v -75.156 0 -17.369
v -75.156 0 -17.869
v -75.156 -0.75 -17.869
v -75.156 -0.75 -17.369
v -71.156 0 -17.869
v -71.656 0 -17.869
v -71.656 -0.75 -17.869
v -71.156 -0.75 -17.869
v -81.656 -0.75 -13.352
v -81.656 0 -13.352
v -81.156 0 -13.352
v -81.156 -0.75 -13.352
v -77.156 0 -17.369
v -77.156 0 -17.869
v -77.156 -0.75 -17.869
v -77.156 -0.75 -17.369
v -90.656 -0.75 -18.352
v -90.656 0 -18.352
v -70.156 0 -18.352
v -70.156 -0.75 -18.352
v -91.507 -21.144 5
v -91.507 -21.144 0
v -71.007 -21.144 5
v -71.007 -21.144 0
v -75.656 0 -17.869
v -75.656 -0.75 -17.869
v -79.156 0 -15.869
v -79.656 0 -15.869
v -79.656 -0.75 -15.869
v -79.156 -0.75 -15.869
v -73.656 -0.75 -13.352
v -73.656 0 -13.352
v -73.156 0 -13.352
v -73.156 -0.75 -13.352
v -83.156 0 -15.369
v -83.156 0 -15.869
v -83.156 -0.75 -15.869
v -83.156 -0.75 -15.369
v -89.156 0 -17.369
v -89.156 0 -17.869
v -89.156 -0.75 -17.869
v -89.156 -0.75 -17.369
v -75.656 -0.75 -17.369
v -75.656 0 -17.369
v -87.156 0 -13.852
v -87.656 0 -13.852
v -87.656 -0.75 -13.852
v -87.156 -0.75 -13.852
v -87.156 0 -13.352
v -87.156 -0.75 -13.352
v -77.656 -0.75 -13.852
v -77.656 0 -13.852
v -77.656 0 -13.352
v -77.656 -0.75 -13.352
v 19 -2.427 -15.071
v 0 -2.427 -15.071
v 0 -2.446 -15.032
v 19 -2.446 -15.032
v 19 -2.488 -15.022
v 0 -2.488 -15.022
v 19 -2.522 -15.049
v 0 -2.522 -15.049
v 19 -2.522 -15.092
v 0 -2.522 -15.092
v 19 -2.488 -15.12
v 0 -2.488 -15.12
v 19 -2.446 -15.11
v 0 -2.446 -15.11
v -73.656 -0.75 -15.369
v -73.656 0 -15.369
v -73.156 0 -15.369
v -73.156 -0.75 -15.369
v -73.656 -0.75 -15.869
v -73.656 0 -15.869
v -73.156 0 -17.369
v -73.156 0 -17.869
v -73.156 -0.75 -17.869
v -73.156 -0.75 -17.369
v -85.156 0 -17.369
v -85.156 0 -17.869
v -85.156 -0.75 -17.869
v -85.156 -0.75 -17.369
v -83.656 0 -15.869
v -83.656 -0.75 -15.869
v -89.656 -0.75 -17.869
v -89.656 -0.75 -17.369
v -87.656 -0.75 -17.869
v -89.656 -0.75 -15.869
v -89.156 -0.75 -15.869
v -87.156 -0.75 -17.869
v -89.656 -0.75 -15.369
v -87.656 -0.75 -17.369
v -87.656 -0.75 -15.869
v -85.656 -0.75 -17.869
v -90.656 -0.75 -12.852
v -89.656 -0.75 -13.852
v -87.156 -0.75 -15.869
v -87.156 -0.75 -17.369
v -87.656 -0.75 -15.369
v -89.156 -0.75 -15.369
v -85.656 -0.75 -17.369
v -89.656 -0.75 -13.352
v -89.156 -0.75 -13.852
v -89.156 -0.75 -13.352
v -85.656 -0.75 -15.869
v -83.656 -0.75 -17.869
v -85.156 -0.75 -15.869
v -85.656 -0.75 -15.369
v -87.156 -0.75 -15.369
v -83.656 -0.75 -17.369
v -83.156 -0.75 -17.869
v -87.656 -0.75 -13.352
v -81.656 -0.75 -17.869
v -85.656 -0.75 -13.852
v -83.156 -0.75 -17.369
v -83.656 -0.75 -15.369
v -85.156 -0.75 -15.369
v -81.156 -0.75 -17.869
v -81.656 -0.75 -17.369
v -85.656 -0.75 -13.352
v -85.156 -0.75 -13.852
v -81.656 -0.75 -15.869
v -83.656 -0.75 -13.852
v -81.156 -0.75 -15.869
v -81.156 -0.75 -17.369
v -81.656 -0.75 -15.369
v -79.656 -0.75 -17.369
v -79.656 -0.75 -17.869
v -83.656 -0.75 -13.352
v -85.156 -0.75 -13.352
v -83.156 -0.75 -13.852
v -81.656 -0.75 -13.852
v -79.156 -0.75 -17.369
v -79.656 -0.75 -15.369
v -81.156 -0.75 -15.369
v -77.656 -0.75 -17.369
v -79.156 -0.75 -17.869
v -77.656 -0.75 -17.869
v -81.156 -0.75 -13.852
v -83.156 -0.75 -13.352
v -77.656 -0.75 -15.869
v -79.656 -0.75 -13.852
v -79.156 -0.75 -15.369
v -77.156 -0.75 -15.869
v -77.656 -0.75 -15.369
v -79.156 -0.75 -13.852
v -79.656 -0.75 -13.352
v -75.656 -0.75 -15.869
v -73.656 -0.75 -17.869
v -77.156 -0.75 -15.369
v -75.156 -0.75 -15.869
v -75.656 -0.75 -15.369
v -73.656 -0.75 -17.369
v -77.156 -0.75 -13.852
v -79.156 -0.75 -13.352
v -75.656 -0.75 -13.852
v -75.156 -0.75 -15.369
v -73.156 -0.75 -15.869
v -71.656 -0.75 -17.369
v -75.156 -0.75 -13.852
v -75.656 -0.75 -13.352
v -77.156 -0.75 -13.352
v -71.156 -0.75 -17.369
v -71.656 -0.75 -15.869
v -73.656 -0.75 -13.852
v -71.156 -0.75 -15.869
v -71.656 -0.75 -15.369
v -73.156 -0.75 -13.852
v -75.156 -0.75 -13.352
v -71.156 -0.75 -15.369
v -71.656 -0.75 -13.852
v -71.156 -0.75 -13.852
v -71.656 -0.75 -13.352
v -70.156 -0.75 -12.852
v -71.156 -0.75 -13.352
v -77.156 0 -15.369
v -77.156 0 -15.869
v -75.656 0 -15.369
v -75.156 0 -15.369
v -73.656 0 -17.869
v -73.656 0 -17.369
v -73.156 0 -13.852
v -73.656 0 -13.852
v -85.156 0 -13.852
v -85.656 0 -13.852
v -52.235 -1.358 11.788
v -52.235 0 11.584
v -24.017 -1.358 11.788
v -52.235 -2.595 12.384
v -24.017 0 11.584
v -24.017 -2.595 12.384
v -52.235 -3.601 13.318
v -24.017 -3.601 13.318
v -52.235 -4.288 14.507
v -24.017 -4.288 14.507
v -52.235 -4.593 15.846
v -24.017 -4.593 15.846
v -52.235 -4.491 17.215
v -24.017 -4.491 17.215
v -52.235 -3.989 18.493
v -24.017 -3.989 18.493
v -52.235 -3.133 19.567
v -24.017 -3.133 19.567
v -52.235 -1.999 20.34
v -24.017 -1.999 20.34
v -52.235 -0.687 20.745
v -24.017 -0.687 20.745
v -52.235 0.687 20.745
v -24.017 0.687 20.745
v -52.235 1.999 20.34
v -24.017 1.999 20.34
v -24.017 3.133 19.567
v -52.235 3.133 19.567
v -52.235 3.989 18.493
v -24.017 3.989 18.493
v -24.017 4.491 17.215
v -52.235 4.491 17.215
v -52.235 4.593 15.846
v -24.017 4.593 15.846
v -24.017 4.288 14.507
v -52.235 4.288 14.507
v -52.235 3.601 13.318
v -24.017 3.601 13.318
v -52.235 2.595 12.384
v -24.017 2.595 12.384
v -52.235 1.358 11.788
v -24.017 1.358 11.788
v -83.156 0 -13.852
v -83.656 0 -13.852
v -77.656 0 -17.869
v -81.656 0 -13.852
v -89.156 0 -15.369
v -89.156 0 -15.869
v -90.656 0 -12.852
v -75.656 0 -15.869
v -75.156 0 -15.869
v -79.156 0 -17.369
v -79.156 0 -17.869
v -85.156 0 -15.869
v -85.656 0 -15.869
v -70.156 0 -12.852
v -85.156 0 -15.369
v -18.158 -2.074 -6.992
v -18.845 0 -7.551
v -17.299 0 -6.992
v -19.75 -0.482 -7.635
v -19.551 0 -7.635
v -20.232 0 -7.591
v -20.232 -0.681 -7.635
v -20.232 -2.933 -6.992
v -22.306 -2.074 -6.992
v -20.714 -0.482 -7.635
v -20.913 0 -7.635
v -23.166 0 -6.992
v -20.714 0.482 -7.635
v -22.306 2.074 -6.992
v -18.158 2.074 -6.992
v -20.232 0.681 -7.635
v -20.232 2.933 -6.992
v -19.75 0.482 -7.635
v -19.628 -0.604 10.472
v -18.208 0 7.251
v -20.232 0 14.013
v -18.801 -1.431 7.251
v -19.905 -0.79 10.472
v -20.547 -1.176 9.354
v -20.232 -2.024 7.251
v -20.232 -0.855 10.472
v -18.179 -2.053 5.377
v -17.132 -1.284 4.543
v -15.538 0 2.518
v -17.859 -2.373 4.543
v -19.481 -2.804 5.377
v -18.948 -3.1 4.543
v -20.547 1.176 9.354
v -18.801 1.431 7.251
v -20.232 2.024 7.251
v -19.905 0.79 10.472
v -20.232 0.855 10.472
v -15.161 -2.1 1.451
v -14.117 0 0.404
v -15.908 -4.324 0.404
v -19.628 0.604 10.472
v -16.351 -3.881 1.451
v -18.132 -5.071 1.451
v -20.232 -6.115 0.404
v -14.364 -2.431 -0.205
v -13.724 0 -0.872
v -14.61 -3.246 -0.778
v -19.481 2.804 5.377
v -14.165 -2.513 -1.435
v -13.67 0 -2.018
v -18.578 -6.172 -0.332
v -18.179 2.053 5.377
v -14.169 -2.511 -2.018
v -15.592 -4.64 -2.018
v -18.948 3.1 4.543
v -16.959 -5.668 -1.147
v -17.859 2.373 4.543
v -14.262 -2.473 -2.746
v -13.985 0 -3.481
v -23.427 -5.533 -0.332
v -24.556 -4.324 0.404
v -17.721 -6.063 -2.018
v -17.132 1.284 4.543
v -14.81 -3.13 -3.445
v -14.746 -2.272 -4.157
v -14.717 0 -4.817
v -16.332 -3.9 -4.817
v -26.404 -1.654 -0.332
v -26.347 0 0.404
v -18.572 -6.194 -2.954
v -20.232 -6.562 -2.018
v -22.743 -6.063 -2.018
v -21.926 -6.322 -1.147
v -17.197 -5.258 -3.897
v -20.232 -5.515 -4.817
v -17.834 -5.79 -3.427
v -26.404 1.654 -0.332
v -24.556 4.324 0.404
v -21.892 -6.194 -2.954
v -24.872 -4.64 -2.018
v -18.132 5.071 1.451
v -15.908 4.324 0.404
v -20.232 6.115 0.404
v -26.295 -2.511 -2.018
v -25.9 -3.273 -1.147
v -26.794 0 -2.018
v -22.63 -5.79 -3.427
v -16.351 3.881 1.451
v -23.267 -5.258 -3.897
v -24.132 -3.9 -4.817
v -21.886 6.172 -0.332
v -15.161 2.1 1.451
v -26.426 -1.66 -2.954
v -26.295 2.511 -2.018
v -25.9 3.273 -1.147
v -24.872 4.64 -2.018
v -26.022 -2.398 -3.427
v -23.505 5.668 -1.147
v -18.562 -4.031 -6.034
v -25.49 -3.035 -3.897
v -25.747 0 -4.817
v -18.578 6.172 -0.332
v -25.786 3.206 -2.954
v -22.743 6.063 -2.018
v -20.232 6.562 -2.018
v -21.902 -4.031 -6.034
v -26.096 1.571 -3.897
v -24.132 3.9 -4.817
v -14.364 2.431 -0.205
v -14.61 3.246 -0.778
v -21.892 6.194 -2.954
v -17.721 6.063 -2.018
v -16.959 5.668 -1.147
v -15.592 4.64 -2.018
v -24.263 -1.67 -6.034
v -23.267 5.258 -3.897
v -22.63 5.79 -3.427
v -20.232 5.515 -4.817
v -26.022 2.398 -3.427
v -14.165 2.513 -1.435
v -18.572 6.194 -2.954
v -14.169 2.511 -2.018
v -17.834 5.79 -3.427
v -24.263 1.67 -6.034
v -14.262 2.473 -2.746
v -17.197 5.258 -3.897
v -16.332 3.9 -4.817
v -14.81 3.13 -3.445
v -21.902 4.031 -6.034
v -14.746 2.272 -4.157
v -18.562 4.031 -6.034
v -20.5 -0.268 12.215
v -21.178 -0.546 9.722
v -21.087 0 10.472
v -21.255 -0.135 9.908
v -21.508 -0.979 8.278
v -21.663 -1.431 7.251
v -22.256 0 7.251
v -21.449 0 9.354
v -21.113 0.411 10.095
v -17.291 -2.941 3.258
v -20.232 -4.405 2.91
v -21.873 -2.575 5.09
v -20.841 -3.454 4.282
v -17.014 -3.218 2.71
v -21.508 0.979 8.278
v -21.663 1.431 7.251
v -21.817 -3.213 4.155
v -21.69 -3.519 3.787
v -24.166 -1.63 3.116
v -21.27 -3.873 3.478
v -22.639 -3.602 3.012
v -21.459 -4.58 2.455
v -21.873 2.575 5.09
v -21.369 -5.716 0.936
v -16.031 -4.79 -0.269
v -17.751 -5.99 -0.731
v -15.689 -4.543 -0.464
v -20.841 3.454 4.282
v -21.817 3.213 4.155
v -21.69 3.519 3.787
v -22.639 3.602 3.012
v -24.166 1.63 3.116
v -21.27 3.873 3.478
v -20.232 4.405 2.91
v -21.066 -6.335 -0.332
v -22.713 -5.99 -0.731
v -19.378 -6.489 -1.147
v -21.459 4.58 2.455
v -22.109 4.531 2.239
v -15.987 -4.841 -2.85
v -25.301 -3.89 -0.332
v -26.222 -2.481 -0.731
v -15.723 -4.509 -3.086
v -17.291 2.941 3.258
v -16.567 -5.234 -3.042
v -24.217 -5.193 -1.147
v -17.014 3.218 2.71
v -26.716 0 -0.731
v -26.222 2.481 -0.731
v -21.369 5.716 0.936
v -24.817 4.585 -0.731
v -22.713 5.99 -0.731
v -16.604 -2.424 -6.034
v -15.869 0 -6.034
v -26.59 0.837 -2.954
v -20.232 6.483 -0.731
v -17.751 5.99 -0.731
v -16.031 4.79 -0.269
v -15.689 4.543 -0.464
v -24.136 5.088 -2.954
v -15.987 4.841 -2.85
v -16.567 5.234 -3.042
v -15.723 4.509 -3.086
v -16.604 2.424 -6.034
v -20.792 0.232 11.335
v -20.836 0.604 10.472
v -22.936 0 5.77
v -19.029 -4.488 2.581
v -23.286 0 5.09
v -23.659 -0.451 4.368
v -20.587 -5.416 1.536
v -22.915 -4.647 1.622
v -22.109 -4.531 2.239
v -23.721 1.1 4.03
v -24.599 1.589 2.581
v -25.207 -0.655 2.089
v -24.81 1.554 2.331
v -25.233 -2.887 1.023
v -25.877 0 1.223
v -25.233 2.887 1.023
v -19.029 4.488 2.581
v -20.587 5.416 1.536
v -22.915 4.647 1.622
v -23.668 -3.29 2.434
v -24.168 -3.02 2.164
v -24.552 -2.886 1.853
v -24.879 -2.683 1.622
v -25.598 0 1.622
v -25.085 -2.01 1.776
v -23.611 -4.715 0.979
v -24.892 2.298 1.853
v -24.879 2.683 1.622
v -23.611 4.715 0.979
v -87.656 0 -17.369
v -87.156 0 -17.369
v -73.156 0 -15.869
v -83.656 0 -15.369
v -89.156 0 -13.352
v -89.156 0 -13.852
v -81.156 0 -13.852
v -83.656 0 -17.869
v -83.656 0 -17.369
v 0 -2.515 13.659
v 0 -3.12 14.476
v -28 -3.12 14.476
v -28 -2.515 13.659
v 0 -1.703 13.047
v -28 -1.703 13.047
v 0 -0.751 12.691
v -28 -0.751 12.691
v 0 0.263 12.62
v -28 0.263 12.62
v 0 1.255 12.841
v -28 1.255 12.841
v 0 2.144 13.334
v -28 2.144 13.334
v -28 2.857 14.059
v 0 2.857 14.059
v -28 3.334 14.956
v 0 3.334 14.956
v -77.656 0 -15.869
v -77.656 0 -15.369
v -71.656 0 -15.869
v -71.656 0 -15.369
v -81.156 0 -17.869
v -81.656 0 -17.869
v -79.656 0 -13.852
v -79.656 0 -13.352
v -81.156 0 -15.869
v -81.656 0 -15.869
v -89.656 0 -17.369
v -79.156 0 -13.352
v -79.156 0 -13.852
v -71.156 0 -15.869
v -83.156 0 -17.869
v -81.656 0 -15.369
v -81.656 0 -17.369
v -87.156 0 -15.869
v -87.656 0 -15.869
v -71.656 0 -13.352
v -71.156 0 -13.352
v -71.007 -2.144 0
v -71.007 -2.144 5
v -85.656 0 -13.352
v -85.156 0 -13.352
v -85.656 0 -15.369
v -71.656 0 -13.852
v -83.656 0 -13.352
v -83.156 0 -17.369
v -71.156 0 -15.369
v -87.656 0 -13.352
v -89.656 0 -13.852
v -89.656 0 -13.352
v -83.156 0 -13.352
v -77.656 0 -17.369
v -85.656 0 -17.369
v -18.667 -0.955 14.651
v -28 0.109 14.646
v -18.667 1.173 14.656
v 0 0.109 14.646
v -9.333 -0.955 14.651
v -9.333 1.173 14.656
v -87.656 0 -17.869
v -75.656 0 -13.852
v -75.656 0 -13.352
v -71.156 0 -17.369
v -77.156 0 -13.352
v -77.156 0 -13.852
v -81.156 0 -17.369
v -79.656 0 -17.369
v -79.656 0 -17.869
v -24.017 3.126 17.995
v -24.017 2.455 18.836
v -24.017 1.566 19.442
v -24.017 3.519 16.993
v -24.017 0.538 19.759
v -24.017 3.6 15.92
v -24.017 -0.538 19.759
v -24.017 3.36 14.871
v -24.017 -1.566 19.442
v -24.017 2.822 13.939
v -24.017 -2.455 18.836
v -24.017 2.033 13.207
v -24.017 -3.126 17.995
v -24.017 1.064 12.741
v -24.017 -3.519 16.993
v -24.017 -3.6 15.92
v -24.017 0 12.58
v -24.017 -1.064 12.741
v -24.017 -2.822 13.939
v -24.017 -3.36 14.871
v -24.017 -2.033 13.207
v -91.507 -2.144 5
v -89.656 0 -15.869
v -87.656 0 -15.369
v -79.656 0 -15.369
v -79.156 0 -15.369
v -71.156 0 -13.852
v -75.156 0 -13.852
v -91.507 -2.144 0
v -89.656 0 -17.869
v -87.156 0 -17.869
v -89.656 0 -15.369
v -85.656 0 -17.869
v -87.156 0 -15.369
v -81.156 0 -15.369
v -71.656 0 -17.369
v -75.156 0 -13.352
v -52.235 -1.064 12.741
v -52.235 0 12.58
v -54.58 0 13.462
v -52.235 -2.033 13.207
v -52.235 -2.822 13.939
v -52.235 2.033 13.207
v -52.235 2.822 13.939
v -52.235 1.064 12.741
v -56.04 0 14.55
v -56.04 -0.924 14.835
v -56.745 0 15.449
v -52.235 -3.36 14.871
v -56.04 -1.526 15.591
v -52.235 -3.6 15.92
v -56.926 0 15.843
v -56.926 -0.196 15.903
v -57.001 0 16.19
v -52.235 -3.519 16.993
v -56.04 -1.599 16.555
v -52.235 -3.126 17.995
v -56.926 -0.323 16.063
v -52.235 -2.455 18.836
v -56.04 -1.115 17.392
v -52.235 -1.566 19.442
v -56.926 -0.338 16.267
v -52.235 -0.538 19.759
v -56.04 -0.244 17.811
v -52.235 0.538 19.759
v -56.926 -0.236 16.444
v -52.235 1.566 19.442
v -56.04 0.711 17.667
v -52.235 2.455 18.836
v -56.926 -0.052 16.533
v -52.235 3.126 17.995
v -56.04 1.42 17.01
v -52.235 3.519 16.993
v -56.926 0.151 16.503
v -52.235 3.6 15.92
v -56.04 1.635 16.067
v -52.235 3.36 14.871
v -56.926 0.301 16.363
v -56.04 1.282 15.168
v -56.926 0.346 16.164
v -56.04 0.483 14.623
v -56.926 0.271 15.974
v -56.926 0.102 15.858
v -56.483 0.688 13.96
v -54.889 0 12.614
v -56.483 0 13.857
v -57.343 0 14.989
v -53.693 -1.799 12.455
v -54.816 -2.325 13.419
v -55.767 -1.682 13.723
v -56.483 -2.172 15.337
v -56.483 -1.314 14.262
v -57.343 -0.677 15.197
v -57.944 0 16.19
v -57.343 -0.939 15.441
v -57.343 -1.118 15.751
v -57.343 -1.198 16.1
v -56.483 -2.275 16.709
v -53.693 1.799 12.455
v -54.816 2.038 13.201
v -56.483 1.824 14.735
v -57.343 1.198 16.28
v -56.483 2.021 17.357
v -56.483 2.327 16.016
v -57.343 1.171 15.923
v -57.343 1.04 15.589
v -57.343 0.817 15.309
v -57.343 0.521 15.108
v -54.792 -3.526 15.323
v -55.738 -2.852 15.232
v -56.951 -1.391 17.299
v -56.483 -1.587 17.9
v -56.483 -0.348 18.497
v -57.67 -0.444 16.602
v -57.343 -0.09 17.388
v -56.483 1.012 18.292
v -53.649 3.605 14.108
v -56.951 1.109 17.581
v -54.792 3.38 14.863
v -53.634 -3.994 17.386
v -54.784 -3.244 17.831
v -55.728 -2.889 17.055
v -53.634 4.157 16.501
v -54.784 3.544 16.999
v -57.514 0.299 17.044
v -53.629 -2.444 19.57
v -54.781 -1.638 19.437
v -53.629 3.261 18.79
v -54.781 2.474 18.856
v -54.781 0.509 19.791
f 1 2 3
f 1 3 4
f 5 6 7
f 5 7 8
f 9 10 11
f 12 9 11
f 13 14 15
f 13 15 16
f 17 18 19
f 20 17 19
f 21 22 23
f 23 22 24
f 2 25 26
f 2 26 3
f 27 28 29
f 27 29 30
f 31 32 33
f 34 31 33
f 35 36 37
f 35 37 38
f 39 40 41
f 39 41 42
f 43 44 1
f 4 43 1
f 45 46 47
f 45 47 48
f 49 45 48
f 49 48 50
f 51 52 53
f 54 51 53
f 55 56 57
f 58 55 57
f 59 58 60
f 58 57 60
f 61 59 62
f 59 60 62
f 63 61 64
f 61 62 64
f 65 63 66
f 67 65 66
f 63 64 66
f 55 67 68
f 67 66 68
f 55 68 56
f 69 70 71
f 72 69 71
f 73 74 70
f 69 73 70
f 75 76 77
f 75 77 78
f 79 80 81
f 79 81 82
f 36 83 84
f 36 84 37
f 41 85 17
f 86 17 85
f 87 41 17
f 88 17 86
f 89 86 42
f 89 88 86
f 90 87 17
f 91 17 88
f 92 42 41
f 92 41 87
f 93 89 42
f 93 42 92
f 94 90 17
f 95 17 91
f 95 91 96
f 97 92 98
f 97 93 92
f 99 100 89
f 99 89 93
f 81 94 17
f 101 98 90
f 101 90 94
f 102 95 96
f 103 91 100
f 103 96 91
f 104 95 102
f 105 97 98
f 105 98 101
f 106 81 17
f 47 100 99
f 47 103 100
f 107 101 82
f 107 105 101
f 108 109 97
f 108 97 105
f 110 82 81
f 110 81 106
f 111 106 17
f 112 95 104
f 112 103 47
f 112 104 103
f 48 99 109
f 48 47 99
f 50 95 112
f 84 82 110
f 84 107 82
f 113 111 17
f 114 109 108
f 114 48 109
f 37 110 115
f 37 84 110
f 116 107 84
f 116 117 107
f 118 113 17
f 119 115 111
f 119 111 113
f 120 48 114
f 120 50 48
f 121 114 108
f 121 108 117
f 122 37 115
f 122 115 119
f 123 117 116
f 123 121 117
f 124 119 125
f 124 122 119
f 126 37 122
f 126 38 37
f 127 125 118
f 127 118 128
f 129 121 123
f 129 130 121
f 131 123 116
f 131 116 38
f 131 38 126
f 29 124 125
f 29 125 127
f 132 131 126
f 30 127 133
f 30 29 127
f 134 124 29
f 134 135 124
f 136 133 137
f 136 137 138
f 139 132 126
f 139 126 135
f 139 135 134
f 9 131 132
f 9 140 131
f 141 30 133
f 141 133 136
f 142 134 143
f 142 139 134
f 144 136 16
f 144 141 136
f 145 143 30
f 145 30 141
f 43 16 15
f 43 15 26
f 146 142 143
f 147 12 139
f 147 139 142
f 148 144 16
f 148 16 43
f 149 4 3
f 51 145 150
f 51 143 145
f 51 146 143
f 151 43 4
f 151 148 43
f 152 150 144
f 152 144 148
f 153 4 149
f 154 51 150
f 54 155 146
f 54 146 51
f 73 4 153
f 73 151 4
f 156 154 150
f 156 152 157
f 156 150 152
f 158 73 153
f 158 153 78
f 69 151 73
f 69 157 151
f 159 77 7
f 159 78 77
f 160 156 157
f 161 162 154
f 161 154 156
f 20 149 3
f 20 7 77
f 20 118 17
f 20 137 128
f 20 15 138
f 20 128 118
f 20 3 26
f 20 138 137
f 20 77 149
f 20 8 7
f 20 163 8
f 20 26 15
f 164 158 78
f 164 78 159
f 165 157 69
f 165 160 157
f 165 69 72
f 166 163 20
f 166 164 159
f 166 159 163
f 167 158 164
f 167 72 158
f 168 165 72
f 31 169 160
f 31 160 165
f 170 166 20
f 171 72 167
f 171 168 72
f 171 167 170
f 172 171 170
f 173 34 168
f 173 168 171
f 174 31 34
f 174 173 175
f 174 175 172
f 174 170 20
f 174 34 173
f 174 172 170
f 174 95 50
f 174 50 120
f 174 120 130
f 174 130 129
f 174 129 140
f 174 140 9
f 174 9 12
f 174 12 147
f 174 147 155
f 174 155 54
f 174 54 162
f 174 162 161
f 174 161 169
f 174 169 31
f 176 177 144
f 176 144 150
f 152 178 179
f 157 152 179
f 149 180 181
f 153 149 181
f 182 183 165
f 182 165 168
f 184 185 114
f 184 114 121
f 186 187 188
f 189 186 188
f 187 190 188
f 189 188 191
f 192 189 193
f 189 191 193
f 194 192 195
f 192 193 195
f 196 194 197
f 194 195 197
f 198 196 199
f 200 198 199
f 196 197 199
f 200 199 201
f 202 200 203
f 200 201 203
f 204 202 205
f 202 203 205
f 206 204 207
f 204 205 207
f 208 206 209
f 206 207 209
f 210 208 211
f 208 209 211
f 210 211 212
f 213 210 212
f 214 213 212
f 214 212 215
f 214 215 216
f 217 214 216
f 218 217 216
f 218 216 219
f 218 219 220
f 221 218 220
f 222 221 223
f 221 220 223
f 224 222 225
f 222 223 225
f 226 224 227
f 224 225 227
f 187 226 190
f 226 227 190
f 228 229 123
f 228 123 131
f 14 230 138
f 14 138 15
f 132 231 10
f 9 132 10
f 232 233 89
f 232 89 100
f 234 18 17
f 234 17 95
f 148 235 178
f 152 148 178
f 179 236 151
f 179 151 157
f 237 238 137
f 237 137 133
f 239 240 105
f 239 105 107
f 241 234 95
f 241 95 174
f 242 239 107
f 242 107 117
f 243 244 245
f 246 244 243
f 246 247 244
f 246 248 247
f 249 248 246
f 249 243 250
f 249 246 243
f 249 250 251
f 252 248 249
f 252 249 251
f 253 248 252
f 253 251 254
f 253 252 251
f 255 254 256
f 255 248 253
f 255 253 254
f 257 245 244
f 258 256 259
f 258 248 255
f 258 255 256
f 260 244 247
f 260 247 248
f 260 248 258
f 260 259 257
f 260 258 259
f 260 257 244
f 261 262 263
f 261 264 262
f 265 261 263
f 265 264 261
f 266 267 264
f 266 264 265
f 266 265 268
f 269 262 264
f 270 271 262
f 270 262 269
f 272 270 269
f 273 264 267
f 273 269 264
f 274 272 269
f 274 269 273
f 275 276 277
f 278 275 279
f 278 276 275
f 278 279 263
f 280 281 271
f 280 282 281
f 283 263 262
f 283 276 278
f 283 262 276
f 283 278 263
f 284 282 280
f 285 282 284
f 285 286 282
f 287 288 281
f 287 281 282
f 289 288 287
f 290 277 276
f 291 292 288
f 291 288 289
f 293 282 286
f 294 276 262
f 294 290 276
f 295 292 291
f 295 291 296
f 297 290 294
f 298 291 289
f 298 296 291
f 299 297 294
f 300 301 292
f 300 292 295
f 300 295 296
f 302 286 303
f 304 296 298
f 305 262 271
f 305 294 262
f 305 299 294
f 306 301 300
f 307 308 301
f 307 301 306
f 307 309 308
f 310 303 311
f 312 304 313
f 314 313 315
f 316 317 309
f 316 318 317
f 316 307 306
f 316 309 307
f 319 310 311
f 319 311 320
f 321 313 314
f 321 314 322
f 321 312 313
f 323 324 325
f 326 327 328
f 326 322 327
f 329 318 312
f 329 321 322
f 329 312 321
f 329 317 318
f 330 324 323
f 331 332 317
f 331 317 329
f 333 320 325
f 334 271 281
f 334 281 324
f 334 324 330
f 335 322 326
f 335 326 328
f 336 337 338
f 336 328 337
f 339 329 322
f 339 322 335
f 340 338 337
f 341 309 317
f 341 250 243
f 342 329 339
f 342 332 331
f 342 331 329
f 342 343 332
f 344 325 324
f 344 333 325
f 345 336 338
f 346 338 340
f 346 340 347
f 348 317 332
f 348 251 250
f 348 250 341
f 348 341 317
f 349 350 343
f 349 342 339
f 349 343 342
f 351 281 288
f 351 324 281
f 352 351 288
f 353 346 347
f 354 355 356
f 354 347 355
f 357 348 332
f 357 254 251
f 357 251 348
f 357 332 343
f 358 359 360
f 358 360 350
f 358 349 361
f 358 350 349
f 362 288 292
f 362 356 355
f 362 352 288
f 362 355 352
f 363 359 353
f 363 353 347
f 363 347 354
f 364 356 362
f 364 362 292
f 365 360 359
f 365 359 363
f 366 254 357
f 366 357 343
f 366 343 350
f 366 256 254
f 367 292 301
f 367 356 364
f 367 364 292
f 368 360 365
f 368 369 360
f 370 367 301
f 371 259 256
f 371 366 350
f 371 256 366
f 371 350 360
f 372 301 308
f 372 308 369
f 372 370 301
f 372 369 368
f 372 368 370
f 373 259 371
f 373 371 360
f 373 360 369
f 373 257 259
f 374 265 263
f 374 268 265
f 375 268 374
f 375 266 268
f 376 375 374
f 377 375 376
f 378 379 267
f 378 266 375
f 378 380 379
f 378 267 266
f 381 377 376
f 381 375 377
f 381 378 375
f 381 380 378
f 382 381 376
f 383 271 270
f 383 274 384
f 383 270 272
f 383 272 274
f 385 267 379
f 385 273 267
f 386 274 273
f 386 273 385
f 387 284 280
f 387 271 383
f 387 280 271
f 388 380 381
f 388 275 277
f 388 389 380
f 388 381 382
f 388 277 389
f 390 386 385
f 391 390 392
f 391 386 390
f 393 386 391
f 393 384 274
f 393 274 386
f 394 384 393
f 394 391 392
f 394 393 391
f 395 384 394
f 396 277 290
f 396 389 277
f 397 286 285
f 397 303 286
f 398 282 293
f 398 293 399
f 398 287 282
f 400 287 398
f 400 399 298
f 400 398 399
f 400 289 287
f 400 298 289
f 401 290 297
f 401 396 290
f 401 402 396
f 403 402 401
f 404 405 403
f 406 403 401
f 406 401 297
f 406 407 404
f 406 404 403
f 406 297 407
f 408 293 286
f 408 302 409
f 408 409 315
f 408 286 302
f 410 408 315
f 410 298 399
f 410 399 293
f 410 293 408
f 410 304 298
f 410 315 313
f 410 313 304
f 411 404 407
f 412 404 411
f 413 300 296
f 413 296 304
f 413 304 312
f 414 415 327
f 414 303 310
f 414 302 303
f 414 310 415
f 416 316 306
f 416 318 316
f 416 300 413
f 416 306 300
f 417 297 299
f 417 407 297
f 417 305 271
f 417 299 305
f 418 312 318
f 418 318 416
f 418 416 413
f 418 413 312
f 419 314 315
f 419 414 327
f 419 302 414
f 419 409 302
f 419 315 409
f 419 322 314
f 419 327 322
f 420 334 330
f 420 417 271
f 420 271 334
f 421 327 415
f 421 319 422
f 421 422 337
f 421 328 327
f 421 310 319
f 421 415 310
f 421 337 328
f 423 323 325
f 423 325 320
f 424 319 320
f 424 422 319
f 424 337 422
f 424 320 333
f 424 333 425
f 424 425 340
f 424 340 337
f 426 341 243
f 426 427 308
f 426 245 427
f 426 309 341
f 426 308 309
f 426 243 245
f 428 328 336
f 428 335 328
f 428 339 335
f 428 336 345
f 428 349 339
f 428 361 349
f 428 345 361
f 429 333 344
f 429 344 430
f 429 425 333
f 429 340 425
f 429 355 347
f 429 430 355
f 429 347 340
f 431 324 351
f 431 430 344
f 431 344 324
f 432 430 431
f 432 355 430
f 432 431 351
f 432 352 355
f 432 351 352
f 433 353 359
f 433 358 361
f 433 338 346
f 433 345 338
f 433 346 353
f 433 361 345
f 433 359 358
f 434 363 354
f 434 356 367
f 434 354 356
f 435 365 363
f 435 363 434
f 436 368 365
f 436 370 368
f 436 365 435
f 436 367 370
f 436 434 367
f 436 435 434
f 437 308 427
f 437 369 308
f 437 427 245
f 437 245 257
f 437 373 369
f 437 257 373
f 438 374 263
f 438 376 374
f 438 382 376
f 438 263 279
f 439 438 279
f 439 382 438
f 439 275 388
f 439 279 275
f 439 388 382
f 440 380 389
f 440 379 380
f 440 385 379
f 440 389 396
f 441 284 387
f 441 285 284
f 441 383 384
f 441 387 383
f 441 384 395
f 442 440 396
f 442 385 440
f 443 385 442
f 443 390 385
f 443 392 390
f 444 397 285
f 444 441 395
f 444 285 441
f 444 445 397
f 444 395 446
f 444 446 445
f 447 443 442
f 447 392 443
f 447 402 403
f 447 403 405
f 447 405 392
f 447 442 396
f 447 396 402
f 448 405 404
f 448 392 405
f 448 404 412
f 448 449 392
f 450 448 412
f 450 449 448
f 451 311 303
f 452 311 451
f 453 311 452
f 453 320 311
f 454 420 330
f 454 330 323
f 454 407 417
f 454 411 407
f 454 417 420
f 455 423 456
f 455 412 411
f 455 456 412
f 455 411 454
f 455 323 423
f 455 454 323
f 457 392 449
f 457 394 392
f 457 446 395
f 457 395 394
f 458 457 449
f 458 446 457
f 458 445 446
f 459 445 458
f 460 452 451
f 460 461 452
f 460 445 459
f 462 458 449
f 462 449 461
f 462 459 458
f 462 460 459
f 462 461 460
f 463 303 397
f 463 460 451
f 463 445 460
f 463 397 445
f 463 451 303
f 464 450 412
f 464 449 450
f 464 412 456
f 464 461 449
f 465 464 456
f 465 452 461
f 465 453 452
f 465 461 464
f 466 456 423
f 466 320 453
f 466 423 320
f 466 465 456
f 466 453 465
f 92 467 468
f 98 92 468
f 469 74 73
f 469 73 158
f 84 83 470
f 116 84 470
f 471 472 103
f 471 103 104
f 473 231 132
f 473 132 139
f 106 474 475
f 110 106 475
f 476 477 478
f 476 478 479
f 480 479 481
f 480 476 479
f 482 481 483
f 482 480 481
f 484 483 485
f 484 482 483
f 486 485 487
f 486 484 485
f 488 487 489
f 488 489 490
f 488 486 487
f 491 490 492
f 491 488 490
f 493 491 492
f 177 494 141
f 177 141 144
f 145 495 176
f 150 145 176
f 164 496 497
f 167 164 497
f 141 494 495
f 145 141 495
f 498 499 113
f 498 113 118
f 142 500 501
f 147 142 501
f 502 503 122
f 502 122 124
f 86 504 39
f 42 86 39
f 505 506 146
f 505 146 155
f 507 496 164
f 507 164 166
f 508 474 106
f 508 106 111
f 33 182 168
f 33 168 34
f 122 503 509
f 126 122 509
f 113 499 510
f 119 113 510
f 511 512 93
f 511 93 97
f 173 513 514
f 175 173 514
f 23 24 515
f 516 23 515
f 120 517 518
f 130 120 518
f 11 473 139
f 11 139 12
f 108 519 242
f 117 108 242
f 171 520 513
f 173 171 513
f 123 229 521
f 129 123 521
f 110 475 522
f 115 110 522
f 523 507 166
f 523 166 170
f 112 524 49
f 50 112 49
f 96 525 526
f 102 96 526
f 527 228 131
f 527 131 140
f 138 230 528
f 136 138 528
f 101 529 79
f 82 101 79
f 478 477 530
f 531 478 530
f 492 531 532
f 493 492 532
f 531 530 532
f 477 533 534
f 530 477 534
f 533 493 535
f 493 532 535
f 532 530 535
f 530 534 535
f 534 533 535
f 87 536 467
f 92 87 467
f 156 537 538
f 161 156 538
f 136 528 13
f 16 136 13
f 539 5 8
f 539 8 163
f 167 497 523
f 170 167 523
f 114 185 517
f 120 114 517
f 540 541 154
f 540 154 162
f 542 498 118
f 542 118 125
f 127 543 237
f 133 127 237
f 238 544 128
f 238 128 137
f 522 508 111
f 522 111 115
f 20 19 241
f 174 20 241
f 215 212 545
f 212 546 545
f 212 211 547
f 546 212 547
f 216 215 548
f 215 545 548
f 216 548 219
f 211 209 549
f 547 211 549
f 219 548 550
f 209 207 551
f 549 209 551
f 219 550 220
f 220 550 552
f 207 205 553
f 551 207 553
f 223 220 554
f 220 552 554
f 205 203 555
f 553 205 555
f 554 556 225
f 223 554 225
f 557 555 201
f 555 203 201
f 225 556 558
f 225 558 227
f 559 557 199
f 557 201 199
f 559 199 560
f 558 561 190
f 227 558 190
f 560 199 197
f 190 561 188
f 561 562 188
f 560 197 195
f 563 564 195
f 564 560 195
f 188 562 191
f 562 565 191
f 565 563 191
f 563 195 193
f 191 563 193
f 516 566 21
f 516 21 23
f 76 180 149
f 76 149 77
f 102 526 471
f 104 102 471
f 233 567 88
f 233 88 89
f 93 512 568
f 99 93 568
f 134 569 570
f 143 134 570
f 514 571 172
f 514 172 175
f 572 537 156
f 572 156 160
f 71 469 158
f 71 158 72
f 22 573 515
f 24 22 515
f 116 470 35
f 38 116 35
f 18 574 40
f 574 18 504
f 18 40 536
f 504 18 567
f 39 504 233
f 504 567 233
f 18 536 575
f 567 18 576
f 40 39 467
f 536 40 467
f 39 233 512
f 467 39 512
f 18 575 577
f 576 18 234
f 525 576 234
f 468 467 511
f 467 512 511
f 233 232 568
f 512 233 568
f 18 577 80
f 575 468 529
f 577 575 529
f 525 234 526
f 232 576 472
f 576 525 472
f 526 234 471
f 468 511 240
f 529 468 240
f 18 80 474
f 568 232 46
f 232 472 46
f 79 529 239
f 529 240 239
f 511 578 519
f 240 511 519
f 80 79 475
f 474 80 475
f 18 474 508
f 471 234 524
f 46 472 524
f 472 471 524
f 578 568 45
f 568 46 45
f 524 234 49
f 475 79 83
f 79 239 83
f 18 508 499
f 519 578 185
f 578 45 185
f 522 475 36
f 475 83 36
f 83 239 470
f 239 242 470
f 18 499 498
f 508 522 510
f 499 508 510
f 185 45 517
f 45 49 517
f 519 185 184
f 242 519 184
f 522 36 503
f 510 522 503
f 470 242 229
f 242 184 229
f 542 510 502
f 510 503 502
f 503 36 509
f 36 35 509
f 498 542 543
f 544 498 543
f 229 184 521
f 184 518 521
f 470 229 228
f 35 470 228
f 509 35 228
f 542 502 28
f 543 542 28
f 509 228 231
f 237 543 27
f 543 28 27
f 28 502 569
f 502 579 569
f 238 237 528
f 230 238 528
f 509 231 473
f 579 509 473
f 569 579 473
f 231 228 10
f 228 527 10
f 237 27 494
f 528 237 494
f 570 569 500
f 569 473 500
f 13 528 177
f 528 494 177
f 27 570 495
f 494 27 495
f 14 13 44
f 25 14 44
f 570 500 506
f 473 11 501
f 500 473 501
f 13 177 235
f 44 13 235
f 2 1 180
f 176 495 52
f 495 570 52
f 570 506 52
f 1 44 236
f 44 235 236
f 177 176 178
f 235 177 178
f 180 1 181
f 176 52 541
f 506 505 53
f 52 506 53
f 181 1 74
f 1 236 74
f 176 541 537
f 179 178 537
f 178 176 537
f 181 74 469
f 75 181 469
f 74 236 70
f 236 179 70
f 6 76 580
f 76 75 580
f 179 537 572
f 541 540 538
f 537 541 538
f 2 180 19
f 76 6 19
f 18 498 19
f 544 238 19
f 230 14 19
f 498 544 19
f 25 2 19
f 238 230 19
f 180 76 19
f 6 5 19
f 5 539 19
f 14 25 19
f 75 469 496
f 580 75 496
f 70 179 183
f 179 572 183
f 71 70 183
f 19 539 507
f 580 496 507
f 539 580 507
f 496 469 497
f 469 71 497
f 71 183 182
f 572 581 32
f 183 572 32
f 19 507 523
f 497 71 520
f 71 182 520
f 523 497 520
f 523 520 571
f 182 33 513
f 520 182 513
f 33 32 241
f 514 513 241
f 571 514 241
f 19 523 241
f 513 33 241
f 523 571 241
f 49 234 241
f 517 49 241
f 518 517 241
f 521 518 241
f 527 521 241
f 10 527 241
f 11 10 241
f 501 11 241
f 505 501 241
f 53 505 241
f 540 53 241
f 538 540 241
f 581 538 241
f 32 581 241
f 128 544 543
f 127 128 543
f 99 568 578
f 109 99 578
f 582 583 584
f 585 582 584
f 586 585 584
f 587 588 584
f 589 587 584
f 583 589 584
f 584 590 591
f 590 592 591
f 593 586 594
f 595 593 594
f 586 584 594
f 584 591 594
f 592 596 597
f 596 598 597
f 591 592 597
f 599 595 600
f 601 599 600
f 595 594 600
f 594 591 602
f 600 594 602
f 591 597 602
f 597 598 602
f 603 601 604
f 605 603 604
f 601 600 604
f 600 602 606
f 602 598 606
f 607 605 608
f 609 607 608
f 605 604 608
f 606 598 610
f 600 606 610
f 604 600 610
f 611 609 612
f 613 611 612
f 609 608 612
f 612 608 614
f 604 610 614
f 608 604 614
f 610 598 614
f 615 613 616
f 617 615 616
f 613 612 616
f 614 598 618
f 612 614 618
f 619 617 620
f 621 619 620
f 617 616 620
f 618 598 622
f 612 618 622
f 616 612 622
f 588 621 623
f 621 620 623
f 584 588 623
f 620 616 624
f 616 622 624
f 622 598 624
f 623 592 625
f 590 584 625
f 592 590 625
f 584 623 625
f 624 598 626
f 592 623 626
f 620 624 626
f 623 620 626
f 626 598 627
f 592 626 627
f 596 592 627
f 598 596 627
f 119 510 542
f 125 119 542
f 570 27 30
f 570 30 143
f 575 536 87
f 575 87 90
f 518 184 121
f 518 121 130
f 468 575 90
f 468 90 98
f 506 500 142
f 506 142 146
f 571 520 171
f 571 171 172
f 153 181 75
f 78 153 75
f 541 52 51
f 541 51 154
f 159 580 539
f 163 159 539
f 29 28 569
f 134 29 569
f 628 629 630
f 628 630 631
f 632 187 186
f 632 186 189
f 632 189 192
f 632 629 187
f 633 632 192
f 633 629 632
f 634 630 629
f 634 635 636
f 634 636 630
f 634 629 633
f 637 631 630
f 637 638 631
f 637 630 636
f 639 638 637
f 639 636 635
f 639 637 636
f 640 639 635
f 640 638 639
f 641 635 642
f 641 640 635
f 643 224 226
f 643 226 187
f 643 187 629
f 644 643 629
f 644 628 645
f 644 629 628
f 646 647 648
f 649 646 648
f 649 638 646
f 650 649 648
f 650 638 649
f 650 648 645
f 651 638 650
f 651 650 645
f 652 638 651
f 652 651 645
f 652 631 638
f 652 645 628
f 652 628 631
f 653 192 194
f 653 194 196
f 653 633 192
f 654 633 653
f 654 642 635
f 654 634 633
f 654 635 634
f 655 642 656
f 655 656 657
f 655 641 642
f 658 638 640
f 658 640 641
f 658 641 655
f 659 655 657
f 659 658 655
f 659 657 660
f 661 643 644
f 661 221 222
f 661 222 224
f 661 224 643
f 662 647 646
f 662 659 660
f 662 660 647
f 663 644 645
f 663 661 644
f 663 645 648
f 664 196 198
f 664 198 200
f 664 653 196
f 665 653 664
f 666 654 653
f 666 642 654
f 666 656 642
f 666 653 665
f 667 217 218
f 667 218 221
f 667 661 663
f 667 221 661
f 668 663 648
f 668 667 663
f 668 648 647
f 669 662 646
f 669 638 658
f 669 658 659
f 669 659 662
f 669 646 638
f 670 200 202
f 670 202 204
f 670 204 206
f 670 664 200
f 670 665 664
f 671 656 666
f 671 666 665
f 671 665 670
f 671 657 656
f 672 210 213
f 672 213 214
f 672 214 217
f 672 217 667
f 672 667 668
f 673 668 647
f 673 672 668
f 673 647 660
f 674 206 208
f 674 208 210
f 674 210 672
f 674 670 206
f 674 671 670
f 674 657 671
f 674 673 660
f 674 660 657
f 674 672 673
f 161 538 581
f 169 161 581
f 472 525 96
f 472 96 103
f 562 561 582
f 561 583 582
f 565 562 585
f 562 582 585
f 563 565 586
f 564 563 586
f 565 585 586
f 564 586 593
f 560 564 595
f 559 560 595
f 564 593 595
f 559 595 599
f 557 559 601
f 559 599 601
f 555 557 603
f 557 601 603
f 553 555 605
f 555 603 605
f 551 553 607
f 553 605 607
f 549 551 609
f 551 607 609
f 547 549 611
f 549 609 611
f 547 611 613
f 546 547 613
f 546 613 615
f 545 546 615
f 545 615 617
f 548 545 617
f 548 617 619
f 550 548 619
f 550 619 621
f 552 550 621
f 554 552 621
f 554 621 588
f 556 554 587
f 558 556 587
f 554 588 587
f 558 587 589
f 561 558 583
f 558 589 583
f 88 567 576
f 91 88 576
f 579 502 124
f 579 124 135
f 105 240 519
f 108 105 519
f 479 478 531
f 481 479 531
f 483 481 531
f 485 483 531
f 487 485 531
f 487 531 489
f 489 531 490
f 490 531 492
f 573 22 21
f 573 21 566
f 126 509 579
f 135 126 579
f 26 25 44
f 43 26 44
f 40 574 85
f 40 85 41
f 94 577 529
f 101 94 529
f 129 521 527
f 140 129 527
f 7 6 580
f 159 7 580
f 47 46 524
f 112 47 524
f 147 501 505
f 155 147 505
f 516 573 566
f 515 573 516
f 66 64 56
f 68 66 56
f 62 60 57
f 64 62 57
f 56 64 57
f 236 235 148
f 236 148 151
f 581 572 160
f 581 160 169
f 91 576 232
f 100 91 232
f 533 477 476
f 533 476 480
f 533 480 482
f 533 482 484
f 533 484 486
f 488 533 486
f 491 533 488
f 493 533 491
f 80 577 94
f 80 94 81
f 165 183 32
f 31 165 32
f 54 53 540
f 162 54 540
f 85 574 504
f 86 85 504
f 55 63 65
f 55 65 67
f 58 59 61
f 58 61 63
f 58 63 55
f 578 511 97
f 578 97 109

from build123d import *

# Parameters (mm, degrees)
F0_W      = 20.5
F0_H      = 5.5
F0_W_2    = 0.5
F0_H_2    = 0.5
F1_DEPTH  = 0.75
F2_R      = 0.05
F3_DEPTH  = 19
F4_W      = 20.5
F4_H      = 19
F5_DEPTH  = 5
F11_DEPTH = 28


with BuildPart() as f1:
    # F0 (on Front) → F1 (new body)
    with BuildSketch(Plane.XZ):
        with Locations((-80.4057919383, -15.6022887528)):
            Rectangle(F0_W, F0_H)
        with Locations((-89.4057919383, -17.6193666086)):
            Rectangle(F0_W_2, F0_H_2, mode=Mode.SUBTRACT)
        with Locations((-87.4057919383, -17.6193666086)):
            Rectangle(F0_W_2, F0_H_2, mode=Mode.SUBTRACT)
        with Locations((-85.4057919383, -17.6193666086)):
            Rectangle(F0_W_2, F0_H_2, mode=Mode.SUBTRACT)
        with Locations((-83.4057919383, -17.6193666086)):
            Rectangle(F0_W_2, F0_H_2, mode=Mode.SUBTRACT)
        with Locations((-81.4057919383, -17.6193666086)):
            Rectangle(F0_W_2, F0_H_2, mode=Mode.SUBTRACT)
        with Locations((-89.4057919383, -15.6193666086)):
            Rectangle(F0_W_2, F0_H_2, mode=Mode.SUBTRACT)
        with Locations((-87.4057919383, -15.6193666086)):
            Rectangle(F0_W_2, F0_H_2, mode=Mode.SUBTRACT)
        with Locations((-85.4057919383, -15.6193666086)):
            Rectangle(F0_W_2, F0_H_2, mode=Mode.SUBTRACT)
        with Locations((-83.4057919383, -15.6193666086)):
            Rectangle(F0_W_2, F0_H_2, mode=Mode.SUBTRACT)
        with Locations((-81.4057919383, -15.6193666086)):
            Rectangle(F0_W_2, F0_H_2, mode=Mode.SUBTRACT)
        with Locations((-79.4057919383, -17.6193666086)):
            Rectangle(F0_W_2, F0_H_2, mode=Mode.SUBTRACT)
        with Locations((-77.4057919383, -17.6193666086)):
            Rectangle(F0_W_2, F0_H_2, mode=Mode.SUBTRACT)
        with Locations((-75.4057919383, -17.6193666086)):
            Rectangle(F0_W_2, F0_H_2, mode=Mode.SUBTRACT)
        with Locations((-73.4057919383, -17.6193666086)):
            Rectangle(F0_W_2, F0_H_2, mode=Mode.SUBTRACT)
        with Locations((-71.4057919383, -17.6193666086)):
            Rectangle(F0_W_2, F0_H_2, mode=Mode.SUBTRACT)
        with Locations((-79.4057919383, -15.6193666086)):
            Rectangle(F0_W_2, F0_H_2, mode=Mode.SUBTRACT)
        with Locations((-77.4057919383, -15.6193666086)):
            Rectangle(F0_W_2, F0_H_2, mode=Mode.SUBTRACT)
        with Locations((-75.4057919383, -15.6193666086)):
            Rectangle(F0_W_2, F0_H_2, mode=Mode.SUBTRACT)
        with Locations((-73.4057919383, -15.6193666086)):
            Rectangle(F0_W_2, F0_H_2, mode=Mode.SUBTRACT)
        with Locations((-71.4057919383, -15.6193666086)):
            Rectangle(F0_W_2, F0_H_2, mode=Mode.SUBTRACT)
        with Locations((-89.4057919383, -13.6022887528)):
            Rectangle(F0_W_2, F0_H_2, mode=Mode.SUBTRACT)
        with Locations((-87.4057919383, -13.6022887528)):
            Rectangle(F0_W_2, F0_H_2, mode=Mode.SUBTRACT)
        with Locations((-85.4057919383, -13.6022887528)):
            Rectangle(F0_W_2, F0_H_2, mode=Mode.SUBTRACT)
        with Locations((-83.4057919383, -13.6022887528)):
            Rectangle(F0_W_2, F0_H_2, mode=Mode.SUBTRACT)
        with Locations((-81.4057919383, -13.6022887528)):
            Rectangle(F0_W_2, F0_H_2, mode=Mode.SUBTRACT)
        with Locations((-79.4057919383, -13.6022887528)):
            Rectangle(F0_W_2, F0_H_2, mode=Mode.SUBTRACT)
        with Locations((-77.4057919383, -13.6022887528)):
            Rectangle(F0_W_2, F0_H_2, mode=Mode.SUBTRACT)
        with Locations((-75.4057919383, -13.6022887528)):
            Rectangle(F0_W_2, F0_H_2, mode=Mode.SUBTRACT)
        with Locations((-73.4057919383, -13.6022887528)):
            Rectangle(F0_W_2, F0_H_2, mode=Mode.SUBTRACT)
        with Locations((-71.4057919383, -13.6022887528)):
            Rectangle(F0_W_2, F0_H_2, mode=Mode.SUBTRACT)
    extrude(amount=F1_DEPTH)


with BuildPart() as f3:
    # F2 (on Right) → F3 (new body)
    with BuildSketch(Plane.YZ):
        with Locations((-2.4769112933, -15.0707624853)):
            Circle(F2_R)
    extrude(amount=F3_DEPTH)


with BuildPart() as f5:
    # F4 (on Top) → F5 (new body)
    with BuildSketch(Plane.XY):
        with Locations((-81.2566767027, -11.6442674911)):
            Rectangle(F4_W, F4_H)
    extrude(amount=F5_DEPTH)


with BuildPart() as f7:
    # F6 (on Front) → F7 (revolve)
    with BuildSketch(Plane.XZ):
        with BuildLine():
            add(Edge.make_bspline(
                [(-20.2320311219, 14.012856409), (-19.4882868281, 9.831524928), (-16.7907268646, 3.4821602733), (-13.4547507348, 0.3531147703), (-13.5515865326, -5.0042936466), (-18.2302639247, -7.9312218988), (-20.2320311219, -7.5911860913)],
                knots=[0, 0, 0, 0, 0.3318119663, 0.5357680394, 0.7470086366, 1, 1, 1, 1], degree=3))
            Line((-20.2320311219, 14.012856409), (-20.2320311219, -7.5911860913))
        make_face()
    revolve(axis=Axis((-20.2320311219, 0, 3.2108351588), (0, 0, -1)))


with BuildPart() as f9:
    # F8 (on Front) → F9 (revolve)
    with BuildSketch(Plane.XZ):
        with BuildLine():
            Line((-52.234553832, 11.5836048499), (-24.0174103528, 11.5836048499))
            Line((-24.0174103528, 11.5836048499), (-24.0174103528, 12.5801386312))
            Line((-24.0174103528, 12.5801386312), (-52.234553832, 12.5801386312))
            add(Edge.make_bspline(
                [(-52.234553832, 12.5801386312), (-55.2447848022, 13.2427780745), (-56.9377876818, 15.1857528836), (-57.0005513728, 16.1899346858)],
                knots=[0, 0, 0, 0, 5.9787423523, 5.9787423523, 5.9787423523, 5.9787423523], degree=3))
            Line((-57.0005513728, 16.1899346858), (-57.9435093849, 16.1899346858))
            add(Edge.make_bspline(
                [(-52.234553832, 11.5836048499), (-55.7901070926, 12.4724936345), (-57.1657336934, 14.3010459012), (-57.9435093849, 16.1899346858)],
                knots=[0, 0, 0, 0, 7.3355605146, 7.3355605146, 7.3355605146, 7.3355605146], degree=3))
        make_face()
    revolve(axis=Axis((-40.9804598689, 0, 16.1899346858), (-1, 0, 0)))


with BuildPart() as f11:
    # F10 (on Right) → F11 (new body)
    with BuildSketch(Plane.YZ):
        with BuildLine():
            ThreePointArc((-3.1200072507, 14.4755104502), (0.2630403523, 12.6204855343), (3.3340571662, 14.9560763055))
            add(Edge.make_bspline(
                [(-3.1200072507, 14.4755104502), (-0.9144920623, 14.8924682289), (1.1341209756, 14.3521744758), (3.3340571662, 14.9560763055)],
                knots=[0, 0, 0, 0, 6.4719310132, 6.4719310132, 6.4719310132, 6.4719310132], degree=3))
        make_face()
    extrude(amount=-F11_DEPTH)


solid = Compound([f1.part, f3.part, f5.part, f7.part, f9.part, f11.part])
